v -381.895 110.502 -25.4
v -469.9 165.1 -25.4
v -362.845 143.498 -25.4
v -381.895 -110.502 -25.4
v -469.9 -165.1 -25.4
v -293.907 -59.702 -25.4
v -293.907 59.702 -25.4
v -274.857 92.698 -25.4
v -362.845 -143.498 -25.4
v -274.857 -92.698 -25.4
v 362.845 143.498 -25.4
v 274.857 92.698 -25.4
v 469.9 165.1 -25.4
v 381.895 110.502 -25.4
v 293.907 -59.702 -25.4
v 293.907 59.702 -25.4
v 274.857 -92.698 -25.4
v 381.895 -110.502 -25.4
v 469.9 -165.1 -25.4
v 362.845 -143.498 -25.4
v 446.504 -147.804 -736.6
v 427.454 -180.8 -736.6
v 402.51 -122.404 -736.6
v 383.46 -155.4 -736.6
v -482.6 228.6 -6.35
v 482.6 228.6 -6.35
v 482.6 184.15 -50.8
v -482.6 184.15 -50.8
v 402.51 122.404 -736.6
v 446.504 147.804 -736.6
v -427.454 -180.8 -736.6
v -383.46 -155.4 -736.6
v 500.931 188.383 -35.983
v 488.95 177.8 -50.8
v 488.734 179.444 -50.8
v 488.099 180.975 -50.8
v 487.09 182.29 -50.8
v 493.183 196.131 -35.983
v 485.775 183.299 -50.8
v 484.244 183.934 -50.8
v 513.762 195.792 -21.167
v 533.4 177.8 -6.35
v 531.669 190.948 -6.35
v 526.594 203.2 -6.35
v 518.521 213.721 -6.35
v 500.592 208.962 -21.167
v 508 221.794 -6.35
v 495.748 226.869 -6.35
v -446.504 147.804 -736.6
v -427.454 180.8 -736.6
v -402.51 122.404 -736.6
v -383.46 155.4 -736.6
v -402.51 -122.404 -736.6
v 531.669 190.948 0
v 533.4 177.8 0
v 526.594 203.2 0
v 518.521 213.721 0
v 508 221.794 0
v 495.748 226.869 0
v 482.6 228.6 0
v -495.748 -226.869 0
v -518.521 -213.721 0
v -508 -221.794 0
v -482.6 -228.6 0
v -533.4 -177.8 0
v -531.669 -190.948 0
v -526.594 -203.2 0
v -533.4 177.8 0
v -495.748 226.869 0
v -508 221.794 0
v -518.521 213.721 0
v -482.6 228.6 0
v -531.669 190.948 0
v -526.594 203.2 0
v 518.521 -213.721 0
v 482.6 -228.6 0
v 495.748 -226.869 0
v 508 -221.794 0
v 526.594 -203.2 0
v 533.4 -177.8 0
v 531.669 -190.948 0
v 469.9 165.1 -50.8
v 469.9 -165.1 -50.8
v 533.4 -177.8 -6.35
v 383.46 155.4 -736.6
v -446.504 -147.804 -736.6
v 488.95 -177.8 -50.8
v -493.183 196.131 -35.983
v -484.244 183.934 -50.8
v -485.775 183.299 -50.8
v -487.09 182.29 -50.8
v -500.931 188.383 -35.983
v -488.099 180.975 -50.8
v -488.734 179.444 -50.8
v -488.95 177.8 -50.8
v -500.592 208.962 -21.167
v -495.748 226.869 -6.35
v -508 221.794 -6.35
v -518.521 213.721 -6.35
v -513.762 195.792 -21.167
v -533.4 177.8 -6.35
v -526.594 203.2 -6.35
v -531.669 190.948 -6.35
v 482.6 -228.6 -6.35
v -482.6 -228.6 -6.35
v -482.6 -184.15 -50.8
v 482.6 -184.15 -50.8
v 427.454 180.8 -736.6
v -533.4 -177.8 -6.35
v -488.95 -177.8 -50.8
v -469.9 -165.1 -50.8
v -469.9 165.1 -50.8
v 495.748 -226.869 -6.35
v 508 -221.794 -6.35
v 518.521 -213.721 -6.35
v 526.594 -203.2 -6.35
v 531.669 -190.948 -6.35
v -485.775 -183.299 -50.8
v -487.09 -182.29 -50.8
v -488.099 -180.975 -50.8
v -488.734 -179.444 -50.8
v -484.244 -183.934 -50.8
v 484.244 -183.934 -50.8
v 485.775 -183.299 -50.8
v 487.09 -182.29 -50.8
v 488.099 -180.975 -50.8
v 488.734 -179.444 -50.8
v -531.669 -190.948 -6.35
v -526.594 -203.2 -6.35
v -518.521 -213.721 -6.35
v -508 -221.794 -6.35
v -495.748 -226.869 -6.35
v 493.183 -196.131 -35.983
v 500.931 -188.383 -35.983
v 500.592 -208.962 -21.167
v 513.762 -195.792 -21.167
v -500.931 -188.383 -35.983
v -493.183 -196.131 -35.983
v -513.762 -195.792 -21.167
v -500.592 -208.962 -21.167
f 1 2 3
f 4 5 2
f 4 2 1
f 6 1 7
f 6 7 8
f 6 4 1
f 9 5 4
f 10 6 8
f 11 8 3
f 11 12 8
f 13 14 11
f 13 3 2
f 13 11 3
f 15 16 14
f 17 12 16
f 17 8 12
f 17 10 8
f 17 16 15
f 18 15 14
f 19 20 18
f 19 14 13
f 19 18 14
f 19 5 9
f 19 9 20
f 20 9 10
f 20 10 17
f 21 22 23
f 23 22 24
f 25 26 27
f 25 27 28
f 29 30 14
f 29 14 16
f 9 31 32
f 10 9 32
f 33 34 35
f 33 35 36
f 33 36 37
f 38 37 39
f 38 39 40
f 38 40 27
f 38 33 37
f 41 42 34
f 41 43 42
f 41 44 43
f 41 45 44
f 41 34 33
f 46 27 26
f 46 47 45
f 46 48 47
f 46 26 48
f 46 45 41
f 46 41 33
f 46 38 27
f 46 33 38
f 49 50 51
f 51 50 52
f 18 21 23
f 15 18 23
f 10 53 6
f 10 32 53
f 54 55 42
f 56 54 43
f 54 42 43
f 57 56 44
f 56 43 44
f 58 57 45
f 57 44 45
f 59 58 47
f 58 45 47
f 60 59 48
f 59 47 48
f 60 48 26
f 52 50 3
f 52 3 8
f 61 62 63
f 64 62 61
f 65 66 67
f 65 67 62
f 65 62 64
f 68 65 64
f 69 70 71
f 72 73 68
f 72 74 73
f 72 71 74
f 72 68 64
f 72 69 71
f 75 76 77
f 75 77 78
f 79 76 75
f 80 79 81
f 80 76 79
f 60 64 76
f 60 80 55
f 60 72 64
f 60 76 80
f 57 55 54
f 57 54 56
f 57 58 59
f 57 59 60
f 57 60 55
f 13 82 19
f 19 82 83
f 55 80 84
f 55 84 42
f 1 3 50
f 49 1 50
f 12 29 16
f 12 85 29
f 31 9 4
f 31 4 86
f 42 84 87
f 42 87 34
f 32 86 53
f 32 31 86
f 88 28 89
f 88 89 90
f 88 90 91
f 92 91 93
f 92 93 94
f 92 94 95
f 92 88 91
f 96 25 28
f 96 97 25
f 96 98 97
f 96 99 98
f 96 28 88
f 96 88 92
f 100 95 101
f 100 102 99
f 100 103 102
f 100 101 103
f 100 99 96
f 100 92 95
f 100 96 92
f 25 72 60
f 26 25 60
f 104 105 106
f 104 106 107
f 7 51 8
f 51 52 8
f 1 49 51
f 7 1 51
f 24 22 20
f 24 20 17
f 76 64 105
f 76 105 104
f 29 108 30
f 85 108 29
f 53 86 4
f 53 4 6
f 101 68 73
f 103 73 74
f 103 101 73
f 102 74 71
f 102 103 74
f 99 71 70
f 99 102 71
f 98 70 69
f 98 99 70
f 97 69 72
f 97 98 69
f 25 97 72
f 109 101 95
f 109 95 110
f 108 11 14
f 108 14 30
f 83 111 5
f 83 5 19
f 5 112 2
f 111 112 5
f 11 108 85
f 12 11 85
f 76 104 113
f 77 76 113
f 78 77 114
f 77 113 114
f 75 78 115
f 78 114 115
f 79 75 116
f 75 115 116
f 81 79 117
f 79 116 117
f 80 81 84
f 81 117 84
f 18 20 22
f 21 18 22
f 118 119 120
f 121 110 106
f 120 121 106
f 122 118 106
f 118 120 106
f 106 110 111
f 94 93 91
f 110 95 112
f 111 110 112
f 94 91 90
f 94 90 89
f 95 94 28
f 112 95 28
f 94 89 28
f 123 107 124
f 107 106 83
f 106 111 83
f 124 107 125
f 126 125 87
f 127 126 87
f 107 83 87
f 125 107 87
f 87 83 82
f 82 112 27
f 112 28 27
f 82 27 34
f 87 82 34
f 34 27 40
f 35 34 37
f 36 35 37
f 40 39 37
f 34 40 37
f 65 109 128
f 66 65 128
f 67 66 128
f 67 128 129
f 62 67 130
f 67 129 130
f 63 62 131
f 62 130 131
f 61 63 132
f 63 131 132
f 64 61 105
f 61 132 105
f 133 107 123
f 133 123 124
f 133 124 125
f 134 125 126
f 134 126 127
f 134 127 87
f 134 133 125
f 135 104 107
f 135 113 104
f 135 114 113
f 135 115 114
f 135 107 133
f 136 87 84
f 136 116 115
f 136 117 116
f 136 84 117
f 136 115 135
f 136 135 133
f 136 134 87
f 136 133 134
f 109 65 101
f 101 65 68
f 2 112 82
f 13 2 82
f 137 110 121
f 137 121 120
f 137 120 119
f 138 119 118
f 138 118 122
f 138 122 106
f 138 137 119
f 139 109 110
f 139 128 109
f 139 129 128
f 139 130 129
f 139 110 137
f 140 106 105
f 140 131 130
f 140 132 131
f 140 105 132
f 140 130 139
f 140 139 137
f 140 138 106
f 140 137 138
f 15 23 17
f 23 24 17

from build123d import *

# Parameters (mm, degrees)
F0_W      = 1066.8
F0_H      = 457.2
F1_DEPTH  = 50.8
F2_R      = 50.8
F3_SIZE   = 44.45
F4_W      = 939.8
F4_H      = 330.2
F5_DEPTH  = 25.4
F10_DEPTH = 19.05


with BuildPart() as f1:
    # F0 (on Top) → F1 (new body)
    with BuildSketch(Plane.XY):
        Rectangle(F0_W, F0_H)
    extrude(amount=-F1_DEPTH)

    # F2
    f2_edges = [f1.edges().sort_by_distance(p)[0] for p in [
        (-533.4, -228.6, -25.4),
        (-533.4, 228.6, -25.4),
        (533.4, -228.6, -25.4),
        (533.4, 228.6, -25.4),
    ]]
    fillet(f2_edges, radius=F2_R)

    # F3
    f3_edges = [f1.edges().sort_by_distance(p)[0] for p in [
        (533.4, 0, -50.8),
    ]]
    chamfer(f3_edges, length=F3_SIZE)

    # F4 (on face) → F5 (cut)
    with BuildSketch(Plane(origin=(0, 0, -50.8), x_dir=(1, 0, 0), z_dir=(0, 0, -1))):
        Rectangle(F4_W, F4_H)
    extrude(amount=-F5_DEPTH, mode=Mode.SUBTRACT)

    # F9 (on face) → F10 (join, symmetric)
    with BuildSketch(Plane(origin=(-38.1, 65.991136, 0), x_dir=(0.866025, 0.5, 0), z_dir=(0.5, -0.866025, 0))):
        Polygon((-409.78602, -736.6), (-284.382272, -25.4), (-385.982272, -25.4), (-460.58602, -736.6), align=None)
    extrude(amount=F10_DEPTH, both=True)

    # F11: F1 across plane


with BuildPart() as f1_1:
    add(f1.part)
    add(f1.part.mirror(Plane.YZ))

    # F12: F1 across plane


with BuildPart() as f1_2:
    add(f1_1.part)
    add(f1_1.part.mirror(Plane.XZ))


solid = f1_2.part
